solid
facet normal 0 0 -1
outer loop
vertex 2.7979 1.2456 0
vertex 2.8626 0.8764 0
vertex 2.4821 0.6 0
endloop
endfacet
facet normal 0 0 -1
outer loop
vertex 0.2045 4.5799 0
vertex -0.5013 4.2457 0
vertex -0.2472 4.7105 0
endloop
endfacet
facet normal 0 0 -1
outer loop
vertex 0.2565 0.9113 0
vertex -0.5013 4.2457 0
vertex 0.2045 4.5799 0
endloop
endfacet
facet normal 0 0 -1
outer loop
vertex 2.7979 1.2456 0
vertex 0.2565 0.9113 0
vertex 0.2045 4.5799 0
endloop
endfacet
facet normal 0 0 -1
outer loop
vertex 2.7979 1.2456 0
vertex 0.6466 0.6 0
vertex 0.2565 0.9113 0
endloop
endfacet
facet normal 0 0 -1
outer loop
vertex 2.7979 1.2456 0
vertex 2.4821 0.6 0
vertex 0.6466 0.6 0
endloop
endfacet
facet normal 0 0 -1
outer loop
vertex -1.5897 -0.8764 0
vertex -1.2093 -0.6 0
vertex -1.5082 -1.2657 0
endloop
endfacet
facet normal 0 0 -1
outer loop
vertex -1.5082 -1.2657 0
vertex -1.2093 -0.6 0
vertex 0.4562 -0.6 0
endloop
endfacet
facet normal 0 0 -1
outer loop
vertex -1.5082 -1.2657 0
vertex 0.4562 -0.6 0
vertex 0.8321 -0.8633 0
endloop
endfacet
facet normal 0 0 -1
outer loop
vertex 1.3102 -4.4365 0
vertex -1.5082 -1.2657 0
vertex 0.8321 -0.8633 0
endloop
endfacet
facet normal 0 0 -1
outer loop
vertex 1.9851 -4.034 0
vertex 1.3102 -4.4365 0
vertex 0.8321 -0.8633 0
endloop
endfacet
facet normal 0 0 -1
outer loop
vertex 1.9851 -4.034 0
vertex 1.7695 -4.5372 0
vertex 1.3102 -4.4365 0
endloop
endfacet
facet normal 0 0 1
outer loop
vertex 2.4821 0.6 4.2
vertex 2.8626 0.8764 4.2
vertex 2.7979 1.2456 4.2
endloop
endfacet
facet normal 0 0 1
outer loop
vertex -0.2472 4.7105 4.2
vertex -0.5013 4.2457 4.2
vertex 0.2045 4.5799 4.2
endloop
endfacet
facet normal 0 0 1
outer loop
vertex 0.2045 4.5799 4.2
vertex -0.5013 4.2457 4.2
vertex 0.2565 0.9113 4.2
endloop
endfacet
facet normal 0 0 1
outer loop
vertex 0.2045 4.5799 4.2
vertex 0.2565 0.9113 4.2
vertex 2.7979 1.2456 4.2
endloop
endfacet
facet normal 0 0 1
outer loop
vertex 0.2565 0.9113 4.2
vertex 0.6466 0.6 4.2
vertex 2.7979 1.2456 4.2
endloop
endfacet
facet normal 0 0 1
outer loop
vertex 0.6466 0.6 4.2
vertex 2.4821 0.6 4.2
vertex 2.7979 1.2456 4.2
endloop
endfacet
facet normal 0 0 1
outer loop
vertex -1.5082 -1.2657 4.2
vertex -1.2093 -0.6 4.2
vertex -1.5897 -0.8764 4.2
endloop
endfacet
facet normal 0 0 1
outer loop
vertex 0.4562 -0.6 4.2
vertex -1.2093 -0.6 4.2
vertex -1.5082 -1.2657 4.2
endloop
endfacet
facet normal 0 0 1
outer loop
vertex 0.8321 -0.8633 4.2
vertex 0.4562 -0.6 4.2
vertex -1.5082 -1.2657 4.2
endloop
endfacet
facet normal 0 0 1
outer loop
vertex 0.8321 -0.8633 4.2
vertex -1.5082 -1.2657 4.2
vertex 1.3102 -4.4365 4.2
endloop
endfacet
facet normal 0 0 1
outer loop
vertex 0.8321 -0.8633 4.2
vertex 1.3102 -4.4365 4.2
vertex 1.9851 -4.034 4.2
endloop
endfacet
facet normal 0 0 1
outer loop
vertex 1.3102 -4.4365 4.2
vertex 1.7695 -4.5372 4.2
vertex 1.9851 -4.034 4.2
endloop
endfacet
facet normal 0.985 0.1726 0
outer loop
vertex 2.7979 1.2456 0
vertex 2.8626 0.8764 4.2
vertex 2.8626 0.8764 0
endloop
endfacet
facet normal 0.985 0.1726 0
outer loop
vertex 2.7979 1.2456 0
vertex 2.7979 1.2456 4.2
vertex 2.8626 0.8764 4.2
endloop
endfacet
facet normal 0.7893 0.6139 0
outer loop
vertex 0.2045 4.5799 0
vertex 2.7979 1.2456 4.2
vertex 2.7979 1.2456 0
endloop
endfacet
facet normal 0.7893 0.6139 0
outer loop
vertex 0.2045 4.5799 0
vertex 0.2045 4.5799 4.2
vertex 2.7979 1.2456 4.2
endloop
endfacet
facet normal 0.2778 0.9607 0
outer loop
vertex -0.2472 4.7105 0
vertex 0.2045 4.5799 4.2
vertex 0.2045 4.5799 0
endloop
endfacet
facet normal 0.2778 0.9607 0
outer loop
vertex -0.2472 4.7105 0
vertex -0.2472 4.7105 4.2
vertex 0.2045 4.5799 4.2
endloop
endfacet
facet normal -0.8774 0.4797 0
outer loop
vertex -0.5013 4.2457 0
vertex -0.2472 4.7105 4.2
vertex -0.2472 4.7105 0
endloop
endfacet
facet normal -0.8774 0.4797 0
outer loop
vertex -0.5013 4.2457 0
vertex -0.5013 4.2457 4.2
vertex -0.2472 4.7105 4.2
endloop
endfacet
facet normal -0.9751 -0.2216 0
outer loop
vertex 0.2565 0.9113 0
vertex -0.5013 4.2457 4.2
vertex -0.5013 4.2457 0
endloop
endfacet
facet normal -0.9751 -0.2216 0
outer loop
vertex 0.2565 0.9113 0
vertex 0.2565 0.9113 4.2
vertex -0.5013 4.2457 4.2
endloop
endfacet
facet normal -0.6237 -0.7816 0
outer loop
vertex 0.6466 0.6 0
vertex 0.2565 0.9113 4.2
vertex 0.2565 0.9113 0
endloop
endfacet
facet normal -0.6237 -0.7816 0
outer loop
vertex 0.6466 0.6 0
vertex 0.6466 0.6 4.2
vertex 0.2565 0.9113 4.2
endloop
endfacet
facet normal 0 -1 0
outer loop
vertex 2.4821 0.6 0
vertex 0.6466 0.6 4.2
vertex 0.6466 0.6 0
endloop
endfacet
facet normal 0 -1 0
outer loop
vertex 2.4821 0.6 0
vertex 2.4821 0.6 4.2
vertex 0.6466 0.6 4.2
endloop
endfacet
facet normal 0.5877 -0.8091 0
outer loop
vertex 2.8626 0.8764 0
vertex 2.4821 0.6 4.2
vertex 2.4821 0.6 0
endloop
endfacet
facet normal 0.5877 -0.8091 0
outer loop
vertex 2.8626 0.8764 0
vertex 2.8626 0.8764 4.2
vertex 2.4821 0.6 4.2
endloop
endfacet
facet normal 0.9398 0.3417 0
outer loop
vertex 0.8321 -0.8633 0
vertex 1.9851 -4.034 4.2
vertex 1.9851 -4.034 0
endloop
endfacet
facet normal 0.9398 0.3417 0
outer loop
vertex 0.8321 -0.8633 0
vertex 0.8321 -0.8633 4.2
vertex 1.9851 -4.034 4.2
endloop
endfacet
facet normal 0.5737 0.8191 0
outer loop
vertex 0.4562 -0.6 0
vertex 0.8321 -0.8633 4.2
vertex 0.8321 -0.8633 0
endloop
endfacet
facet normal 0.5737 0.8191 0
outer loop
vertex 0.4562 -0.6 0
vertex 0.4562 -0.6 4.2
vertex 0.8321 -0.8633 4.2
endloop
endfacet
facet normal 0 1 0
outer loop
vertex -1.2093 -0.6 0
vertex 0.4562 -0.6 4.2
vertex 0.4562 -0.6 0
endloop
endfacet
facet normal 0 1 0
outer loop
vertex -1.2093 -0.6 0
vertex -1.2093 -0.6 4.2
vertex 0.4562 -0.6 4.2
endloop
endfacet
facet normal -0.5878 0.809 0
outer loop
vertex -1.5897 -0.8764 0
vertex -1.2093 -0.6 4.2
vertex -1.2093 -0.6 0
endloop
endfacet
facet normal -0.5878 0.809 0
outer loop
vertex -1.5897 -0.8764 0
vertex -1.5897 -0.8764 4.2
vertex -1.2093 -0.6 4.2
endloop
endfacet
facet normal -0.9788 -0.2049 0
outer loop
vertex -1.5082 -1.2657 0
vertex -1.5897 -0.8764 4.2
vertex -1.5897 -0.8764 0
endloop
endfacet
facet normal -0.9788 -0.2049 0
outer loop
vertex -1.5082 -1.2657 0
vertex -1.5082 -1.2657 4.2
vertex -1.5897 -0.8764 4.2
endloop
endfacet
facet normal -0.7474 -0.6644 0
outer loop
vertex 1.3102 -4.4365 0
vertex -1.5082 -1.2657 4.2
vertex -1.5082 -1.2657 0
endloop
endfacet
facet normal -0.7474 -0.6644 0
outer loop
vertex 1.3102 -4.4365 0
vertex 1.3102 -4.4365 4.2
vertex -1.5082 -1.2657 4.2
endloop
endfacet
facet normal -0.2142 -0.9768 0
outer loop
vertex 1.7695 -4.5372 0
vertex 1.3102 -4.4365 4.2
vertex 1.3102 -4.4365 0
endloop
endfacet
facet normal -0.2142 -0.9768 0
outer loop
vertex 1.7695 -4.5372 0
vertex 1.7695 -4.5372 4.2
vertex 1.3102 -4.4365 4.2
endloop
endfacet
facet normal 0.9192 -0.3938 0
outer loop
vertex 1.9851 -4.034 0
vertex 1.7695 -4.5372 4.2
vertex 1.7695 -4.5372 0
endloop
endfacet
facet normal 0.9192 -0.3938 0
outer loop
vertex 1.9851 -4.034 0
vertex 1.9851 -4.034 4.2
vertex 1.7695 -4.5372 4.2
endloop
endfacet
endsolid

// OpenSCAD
// studs/lightning.scad — zigzag bolt.
// MIT licensed.
//
// Festival/cyberpunk set. A flash-of-lightning silhouette extruded low.

module stud_lightning(size = 6, tip_radius = 0.4, height = undef) {
    h = is_undef(height) ? size * 0.35 : height;
    // 6-point polygon making a stylized bolt; coords scaled to fit
    // within [-size/2, size/2] in both axes.
    s = size / 2;
    points = [
        [-0.15 * s,  1.00 * s],
        [ 0.55 * s,  0.10 * s],
        [ 0.05 * s,  0.10 * s],
        [ 0.45 * s, -1.00 * s],
        [-0.35 * s, -0.10 * s],
        [ 0.10 * s, -0.10 * s],
    ];

    if (tip_radius > 0) {
        linear_extrude(height = h)
            offset(r = tip_radius)
                offset(delta = -tip_radius)
                    polygon(points);
    } else {
        linear_extrude(height = h)
            polygon(points);
    }
}

stud_lightning(size = 12);
